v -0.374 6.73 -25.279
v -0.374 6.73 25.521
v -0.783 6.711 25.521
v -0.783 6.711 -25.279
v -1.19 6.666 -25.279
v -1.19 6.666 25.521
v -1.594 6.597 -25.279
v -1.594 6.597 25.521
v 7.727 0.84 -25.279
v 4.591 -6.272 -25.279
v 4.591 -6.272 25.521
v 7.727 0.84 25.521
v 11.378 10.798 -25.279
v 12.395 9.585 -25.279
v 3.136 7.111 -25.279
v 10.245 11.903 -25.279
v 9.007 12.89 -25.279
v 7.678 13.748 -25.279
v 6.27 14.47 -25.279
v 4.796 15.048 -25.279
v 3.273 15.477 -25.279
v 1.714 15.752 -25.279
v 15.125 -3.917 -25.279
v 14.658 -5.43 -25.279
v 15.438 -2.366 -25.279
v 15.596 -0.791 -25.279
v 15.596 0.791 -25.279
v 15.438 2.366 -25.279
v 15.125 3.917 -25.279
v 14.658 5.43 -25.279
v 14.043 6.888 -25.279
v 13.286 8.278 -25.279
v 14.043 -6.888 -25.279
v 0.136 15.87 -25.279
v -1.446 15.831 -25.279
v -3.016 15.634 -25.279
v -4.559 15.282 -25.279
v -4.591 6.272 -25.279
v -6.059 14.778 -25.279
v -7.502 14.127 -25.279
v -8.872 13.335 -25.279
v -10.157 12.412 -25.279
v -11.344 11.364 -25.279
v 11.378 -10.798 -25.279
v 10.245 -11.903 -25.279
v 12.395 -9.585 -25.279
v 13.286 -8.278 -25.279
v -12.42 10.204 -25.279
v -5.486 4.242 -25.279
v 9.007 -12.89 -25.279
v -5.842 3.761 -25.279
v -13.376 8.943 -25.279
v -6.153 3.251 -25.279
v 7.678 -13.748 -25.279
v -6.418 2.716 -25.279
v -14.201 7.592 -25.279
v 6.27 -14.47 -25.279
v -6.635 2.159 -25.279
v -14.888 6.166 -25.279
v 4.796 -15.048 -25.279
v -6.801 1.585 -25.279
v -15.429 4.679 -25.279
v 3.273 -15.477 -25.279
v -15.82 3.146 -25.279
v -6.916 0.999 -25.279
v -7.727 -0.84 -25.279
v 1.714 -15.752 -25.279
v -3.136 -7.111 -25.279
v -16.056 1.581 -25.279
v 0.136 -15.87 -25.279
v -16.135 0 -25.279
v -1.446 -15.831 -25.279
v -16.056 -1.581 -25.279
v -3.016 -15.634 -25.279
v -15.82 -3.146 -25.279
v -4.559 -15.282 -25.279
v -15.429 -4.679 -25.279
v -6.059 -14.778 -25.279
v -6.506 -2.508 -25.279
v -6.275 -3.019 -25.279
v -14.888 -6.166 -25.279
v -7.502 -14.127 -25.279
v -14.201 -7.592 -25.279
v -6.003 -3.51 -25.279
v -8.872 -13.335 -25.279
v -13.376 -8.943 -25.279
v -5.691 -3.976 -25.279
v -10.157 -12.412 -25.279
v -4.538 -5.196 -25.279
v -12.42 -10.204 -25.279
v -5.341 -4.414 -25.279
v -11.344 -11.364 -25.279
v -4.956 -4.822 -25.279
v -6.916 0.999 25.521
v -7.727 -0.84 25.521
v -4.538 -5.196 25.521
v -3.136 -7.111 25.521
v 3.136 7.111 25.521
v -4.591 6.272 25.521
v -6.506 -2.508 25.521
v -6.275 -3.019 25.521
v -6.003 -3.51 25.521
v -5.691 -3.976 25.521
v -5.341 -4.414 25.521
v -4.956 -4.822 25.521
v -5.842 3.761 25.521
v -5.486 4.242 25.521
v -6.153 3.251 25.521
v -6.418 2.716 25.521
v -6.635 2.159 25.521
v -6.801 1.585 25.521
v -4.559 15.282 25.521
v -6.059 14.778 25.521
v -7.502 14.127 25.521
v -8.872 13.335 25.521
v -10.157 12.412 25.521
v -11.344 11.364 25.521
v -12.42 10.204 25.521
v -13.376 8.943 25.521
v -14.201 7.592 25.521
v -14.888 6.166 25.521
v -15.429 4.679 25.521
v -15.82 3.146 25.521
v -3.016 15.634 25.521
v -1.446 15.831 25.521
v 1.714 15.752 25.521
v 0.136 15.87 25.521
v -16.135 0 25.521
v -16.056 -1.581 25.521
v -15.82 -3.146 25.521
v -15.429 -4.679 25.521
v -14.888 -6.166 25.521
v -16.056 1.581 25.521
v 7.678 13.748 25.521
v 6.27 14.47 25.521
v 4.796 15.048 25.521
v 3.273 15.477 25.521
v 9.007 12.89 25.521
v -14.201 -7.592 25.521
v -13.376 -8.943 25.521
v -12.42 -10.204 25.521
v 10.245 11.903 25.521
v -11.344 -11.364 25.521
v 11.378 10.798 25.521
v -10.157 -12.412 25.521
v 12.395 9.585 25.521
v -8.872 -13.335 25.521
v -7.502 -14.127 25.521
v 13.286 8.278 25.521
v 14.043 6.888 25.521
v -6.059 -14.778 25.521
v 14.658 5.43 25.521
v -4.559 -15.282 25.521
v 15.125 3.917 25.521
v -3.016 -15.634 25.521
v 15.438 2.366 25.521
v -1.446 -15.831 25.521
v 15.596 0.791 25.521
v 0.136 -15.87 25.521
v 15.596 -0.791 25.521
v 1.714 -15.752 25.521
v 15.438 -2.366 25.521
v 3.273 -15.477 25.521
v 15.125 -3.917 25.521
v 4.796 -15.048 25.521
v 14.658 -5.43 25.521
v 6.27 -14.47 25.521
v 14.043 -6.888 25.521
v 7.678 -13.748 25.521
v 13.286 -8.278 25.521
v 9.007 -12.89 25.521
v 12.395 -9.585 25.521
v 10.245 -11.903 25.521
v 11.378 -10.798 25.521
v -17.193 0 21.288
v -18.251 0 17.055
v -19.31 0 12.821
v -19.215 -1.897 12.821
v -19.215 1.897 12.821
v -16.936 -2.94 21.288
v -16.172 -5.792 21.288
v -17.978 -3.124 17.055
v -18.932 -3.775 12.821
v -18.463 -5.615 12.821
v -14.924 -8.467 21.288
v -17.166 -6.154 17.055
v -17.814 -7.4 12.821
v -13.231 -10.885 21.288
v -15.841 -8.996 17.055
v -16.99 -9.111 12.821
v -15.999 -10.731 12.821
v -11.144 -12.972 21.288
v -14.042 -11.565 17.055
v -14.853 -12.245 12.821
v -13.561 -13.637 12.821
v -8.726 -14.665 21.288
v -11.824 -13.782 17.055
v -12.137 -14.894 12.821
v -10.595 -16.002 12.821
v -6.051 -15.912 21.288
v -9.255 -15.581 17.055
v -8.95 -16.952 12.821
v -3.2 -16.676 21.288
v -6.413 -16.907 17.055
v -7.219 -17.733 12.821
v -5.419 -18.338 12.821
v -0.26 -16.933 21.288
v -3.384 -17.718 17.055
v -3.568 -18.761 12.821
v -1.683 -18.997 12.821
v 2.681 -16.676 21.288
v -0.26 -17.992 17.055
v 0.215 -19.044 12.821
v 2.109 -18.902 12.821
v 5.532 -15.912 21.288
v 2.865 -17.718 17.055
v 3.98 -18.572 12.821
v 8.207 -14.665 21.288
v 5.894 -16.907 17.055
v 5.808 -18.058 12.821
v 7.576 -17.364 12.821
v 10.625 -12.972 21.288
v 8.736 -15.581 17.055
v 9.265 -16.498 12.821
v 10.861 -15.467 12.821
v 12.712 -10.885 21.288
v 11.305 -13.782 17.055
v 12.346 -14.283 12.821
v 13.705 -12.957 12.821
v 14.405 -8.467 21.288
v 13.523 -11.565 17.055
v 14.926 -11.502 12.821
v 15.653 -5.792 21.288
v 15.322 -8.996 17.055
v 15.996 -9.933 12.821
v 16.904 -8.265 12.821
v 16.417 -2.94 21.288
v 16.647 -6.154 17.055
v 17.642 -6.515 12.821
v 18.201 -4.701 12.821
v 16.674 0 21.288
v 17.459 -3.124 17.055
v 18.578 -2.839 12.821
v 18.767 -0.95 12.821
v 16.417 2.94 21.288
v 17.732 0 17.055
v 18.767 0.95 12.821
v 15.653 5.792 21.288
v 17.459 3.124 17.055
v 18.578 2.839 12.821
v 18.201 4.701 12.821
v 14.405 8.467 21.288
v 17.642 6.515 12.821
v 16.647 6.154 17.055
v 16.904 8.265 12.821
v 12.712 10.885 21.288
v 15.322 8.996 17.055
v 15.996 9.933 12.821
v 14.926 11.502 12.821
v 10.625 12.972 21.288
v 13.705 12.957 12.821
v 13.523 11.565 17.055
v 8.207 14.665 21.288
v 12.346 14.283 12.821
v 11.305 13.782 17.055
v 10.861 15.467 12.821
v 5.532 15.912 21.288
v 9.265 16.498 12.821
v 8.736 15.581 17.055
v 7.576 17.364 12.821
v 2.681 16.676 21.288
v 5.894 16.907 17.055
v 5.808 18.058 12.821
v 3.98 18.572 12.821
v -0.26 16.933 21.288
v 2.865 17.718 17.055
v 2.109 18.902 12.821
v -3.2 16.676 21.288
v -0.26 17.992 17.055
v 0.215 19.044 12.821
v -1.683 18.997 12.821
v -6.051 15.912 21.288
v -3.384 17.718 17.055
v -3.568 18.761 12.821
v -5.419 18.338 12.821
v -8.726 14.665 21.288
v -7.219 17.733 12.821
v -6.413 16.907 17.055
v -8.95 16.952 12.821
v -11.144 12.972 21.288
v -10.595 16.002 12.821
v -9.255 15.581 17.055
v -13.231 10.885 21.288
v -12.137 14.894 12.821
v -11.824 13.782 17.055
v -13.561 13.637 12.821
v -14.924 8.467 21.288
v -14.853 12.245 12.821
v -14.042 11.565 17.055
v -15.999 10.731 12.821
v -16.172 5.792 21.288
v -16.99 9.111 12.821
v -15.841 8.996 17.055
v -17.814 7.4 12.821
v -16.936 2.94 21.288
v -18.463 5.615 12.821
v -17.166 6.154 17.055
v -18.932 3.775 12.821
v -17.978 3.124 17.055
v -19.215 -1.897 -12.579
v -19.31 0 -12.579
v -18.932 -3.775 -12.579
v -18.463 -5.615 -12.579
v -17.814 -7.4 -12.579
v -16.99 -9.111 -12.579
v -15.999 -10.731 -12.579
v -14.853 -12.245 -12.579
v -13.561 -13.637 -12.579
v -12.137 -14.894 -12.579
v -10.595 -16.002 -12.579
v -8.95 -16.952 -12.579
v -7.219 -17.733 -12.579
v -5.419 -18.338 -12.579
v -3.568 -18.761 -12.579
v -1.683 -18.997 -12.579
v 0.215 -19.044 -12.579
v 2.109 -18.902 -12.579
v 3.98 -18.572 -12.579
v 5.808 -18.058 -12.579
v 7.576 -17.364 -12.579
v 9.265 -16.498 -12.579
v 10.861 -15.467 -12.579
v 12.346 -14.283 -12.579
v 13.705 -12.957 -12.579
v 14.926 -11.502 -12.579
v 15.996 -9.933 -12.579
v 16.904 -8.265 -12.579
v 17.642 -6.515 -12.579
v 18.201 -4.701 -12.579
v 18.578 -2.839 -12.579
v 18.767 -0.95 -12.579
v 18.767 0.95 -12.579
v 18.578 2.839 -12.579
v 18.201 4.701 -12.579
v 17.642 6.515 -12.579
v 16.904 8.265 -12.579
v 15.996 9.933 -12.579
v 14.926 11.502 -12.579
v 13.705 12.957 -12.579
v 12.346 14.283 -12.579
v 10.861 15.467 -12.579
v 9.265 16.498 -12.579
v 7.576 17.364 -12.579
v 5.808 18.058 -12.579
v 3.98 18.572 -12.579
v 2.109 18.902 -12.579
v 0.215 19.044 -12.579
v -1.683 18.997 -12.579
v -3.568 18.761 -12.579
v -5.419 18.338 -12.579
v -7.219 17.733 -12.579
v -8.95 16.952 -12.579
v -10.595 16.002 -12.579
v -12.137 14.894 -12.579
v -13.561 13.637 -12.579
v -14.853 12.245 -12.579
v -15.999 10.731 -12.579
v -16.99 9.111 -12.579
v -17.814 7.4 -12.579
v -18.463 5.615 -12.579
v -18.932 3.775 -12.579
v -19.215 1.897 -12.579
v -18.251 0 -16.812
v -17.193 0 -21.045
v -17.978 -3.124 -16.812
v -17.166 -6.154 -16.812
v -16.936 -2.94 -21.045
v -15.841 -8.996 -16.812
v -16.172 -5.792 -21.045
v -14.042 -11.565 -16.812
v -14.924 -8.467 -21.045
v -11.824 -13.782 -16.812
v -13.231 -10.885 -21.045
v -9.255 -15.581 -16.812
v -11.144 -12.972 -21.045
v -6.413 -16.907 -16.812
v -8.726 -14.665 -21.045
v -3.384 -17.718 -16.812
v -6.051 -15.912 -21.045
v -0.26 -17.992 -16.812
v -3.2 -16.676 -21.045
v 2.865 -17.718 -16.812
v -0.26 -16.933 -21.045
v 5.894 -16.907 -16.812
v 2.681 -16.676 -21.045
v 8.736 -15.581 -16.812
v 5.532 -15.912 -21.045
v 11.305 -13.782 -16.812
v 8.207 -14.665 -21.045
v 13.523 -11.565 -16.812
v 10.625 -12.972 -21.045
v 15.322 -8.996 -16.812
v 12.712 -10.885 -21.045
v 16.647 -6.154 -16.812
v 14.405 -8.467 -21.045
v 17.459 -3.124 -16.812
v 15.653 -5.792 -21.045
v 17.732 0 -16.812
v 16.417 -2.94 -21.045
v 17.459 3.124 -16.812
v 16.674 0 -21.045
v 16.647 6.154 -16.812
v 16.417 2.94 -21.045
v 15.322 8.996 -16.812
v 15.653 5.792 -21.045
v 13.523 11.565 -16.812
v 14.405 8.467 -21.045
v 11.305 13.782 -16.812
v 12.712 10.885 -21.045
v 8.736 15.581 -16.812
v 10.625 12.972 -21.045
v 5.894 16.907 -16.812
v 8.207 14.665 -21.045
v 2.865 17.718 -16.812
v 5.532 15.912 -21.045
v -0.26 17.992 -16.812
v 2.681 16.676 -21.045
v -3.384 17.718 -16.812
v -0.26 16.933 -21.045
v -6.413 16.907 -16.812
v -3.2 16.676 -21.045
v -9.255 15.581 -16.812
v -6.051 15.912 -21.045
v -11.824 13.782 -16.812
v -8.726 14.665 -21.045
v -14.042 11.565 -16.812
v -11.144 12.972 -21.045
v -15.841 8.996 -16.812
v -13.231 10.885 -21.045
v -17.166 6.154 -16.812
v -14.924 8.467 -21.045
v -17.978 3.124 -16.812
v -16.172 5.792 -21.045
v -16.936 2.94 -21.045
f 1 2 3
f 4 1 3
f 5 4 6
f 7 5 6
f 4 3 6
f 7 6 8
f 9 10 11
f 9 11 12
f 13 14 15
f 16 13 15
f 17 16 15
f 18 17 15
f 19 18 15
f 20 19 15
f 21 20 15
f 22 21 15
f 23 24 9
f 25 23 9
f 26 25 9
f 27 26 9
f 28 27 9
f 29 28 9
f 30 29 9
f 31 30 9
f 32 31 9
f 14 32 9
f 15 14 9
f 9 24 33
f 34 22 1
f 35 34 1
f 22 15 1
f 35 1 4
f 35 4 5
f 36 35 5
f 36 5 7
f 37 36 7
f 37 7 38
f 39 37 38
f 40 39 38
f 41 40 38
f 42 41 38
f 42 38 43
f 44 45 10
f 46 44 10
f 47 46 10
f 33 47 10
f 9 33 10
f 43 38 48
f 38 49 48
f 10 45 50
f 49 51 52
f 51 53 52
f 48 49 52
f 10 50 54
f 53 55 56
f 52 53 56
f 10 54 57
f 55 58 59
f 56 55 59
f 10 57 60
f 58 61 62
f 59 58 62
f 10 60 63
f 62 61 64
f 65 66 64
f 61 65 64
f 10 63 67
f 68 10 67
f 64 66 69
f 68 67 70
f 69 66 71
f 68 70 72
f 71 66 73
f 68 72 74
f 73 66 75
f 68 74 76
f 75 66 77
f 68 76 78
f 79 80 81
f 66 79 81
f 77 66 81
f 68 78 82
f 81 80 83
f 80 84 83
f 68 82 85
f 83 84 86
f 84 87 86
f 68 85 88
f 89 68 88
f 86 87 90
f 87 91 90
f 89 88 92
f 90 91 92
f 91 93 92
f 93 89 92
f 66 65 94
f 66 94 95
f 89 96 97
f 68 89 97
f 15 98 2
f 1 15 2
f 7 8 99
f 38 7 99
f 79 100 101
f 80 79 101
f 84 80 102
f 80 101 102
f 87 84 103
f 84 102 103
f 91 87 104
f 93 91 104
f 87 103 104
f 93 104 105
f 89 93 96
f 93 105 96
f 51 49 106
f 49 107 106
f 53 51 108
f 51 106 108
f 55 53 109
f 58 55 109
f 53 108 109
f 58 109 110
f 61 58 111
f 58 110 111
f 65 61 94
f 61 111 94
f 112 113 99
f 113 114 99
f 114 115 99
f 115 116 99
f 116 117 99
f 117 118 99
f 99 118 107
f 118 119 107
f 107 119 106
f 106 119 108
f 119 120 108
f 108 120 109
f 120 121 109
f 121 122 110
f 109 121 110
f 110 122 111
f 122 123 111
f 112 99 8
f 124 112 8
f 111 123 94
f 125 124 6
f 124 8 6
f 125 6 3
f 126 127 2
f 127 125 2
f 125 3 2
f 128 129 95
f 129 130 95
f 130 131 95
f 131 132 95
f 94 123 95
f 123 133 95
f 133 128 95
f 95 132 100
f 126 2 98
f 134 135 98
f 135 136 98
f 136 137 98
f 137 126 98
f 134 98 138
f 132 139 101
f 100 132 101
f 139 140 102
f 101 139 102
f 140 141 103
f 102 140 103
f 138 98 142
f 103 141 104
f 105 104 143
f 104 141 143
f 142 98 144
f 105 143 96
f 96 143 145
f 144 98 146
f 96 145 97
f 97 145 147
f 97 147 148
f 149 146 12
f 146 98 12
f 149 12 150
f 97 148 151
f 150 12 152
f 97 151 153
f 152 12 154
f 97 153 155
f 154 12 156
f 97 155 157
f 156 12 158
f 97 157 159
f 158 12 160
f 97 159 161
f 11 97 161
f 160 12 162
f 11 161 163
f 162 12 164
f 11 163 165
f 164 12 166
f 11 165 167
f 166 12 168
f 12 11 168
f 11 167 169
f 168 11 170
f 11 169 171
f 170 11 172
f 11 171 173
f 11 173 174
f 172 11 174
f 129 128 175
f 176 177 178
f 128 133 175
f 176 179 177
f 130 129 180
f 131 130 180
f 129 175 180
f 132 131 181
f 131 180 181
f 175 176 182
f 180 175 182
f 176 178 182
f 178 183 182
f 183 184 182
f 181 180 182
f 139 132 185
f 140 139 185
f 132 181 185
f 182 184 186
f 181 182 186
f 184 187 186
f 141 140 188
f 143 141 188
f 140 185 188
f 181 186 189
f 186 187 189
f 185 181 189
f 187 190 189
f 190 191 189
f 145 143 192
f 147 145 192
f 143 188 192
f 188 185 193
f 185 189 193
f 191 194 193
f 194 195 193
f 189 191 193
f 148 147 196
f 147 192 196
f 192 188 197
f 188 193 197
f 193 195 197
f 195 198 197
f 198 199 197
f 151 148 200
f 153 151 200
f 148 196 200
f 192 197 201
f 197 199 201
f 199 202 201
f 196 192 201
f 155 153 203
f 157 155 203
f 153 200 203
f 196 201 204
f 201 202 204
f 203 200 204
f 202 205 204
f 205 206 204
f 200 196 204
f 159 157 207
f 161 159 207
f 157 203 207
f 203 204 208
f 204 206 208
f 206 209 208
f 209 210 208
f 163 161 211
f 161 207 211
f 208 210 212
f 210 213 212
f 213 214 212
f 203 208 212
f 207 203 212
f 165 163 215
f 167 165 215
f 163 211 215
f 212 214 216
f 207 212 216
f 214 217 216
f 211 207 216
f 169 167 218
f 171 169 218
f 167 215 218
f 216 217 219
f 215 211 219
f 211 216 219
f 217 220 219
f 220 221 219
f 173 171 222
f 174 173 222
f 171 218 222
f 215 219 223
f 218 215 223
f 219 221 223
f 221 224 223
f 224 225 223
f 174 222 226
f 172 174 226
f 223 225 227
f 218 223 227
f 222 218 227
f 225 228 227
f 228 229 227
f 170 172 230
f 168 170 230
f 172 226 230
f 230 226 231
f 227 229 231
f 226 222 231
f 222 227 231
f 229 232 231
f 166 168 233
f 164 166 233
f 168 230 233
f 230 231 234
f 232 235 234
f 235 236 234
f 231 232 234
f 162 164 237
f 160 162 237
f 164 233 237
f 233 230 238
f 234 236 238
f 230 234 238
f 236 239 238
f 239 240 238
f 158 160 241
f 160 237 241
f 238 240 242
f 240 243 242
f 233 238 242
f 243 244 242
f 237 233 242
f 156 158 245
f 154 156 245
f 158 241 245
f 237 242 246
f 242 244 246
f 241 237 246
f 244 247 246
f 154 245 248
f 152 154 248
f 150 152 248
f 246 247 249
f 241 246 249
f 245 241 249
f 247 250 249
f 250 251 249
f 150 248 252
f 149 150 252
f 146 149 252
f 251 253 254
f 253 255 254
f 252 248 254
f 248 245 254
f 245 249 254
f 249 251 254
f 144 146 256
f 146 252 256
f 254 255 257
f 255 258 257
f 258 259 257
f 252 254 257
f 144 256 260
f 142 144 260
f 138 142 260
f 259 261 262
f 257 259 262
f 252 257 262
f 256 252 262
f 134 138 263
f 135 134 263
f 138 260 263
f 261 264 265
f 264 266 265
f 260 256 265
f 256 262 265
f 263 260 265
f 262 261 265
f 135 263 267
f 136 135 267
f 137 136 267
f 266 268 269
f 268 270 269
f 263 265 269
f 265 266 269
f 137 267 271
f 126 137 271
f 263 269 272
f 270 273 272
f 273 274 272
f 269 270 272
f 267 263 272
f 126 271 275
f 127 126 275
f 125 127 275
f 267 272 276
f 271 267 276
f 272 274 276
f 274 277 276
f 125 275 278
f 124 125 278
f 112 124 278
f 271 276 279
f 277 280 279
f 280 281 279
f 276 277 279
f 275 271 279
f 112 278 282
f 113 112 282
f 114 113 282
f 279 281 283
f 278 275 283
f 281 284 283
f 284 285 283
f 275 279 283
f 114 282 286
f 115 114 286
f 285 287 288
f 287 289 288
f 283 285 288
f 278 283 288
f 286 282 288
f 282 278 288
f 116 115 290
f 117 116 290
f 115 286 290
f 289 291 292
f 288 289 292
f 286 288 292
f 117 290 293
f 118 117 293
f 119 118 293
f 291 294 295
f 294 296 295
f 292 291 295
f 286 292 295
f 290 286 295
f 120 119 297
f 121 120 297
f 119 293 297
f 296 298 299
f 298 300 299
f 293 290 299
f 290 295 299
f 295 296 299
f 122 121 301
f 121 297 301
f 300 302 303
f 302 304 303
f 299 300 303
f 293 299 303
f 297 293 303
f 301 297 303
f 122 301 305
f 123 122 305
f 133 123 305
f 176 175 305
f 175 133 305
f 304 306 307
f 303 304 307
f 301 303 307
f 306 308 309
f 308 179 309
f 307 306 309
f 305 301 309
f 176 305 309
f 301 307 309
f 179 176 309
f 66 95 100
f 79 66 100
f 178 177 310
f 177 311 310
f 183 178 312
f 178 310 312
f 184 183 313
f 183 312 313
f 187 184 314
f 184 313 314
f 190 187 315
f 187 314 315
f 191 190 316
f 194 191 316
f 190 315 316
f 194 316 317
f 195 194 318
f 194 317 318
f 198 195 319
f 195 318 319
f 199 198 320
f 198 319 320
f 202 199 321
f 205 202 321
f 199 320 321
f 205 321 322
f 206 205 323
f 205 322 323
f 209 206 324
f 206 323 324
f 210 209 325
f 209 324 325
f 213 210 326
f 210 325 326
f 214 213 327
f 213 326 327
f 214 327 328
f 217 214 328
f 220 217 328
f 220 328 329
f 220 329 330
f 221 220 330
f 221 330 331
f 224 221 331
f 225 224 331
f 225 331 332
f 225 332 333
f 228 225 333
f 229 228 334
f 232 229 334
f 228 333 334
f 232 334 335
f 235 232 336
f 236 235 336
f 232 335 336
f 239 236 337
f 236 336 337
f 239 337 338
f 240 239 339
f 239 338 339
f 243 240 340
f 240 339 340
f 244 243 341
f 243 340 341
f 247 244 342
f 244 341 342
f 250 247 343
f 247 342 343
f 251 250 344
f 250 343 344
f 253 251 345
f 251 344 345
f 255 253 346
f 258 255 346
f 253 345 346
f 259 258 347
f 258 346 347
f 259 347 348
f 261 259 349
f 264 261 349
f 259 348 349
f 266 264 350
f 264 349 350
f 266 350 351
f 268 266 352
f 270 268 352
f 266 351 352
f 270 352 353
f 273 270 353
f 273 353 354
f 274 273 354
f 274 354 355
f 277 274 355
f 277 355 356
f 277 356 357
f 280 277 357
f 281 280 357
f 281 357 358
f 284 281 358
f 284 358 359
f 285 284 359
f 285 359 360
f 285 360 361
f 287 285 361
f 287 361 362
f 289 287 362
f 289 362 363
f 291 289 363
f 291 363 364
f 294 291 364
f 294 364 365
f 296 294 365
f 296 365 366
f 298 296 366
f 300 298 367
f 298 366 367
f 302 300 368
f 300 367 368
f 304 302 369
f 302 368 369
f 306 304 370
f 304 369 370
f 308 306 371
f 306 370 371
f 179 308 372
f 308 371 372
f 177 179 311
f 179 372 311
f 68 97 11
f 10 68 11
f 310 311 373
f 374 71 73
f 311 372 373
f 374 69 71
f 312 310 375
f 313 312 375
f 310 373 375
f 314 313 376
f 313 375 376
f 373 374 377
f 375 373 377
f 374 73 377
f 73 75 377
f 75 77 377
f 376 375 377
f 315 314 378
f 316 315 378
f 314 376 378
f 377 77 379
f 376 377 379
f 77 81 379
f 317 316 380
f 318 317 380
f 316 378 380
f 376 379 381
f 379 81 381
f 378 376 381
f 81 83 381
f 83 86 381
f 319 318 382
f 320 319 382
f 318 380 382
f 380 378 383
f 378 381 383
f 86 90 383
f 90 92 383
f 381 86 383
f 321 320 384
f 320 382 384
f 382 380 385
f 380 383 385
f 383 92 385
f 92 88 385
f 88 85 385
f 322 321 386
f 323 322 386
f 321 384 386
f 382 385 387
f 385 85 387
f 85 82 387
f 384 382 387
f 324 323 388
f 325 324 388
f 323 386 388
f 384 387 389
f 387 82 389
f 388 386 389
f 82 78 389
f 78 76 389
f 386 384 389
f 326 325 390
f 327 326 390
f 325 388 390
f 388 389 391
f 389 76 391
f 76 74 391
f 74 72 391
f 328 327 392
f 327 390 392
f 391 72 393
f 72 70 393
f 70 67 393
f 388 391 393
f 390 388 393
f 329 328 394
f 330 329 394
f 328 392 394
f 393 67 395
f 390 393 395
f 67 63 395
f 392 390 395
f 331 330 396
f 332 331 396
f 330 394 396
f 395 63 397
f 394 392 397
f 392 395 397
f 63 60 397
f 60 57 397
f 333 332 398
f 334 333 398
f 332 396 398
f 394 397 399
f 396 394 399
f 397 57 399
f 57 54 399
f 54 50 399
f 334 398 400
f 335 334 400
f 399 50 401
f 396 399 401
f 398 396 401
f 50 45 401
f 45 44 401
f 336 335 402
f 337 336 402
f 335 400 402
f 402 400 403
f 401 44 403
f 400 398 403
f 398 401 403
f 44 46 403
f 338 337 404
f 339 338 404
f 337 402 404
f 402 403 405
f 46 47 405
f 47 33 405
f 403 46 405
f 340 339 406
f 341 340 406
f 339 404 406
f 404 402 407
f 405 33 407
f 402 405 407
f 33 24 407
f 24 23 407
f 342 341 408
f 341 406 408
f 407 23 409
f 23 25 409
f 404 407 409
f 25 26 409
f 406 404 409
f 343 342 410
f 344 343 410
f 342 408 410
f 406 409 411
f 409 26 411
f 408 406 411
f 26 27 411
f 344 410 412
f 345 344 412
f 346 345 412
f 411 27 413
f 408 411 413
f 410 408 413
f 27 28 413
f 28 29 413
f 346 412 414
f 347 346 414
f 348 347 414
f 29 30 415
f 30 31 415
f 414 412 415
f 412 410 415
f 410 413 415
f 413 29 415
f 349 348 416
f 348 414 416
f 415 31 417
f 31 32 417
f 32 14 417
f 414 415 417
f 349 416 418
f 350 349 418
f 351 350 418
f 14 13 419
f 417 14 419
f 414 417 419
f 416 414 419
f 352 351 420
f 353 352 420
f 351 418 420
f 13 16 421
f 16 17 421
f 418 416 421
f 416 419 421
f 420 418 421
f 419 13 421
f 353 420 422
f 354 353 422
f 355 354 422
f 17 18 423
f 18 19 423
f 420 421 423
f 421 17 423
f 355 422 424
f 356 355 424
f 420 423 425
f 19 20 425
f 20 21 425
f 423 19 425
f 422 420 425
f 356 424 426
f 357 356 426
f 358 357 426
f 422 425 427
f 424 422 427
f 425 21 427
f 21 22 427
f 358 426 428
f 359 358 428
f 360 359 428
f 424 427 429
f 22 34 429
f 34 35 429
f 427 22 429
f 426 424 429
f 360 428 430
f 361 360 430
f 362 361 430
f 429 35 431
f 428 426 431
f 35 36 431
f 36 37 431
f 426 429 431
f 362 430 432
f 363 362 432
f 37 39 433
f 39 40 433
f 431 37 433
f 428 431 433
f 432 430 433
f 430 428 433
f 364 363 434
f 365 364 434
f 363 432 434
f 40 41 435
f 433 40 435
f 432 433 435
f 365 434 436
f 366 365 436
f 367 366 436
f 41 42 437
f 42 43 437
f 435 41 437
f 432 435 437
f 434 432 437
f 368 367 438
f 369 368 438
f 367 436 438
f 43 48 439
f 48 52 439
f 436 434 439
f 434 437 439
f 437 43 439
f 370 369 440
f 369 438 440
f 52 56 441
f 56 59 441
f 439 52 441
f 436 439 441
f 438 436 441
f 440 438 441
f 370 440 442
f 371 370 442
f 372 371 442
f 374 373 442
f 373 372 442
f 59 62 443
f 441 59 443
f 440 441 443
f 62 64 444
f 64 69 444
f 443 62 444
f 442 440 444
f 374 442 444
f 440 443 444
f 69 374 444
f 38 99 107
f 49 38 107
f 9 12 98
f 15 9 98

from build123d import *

# Parameters (mm, degrees)
F3_DEPTH      = 50.8
F3_DEPTH_BACK = -50.8


with BuildPart() as f1:
    # F0 (on Front) → F1 (revolve)
    with BuildSketch(Plane.XZ):
        Polygon((-16.134506, -25.27852), (-6.990506, -25.27852), (-6.990506, 25.52148), (-16.134506, 25.52148), (-19.309506, 12.82148), (-19.309506, -12.57852), align=None)
    revolve(axis=Axis((-0.259506, 0, -0.29264), (0, 0, 1)))

    # F2 (on Top) → F3 (cut, two sides)
    with BuildSketch(Plane.XY) as f3_sk:
        Polygon((7.726794, 0.839726), (3.136173, 7.111463), (-4.590621, 6.271737), (-7.726794, -0.839726), (-3.136173, -7.111463), (4.590621, -6.271737), align=None)
    extrude(amount=-F3_DEPTH, mode=Mode.SUBTRACT)
    extrude(f3_sk.sketch, amount=-F3_DEPTH_BACK, mode=Mode.SUBTRACT)


solid = f1.part
